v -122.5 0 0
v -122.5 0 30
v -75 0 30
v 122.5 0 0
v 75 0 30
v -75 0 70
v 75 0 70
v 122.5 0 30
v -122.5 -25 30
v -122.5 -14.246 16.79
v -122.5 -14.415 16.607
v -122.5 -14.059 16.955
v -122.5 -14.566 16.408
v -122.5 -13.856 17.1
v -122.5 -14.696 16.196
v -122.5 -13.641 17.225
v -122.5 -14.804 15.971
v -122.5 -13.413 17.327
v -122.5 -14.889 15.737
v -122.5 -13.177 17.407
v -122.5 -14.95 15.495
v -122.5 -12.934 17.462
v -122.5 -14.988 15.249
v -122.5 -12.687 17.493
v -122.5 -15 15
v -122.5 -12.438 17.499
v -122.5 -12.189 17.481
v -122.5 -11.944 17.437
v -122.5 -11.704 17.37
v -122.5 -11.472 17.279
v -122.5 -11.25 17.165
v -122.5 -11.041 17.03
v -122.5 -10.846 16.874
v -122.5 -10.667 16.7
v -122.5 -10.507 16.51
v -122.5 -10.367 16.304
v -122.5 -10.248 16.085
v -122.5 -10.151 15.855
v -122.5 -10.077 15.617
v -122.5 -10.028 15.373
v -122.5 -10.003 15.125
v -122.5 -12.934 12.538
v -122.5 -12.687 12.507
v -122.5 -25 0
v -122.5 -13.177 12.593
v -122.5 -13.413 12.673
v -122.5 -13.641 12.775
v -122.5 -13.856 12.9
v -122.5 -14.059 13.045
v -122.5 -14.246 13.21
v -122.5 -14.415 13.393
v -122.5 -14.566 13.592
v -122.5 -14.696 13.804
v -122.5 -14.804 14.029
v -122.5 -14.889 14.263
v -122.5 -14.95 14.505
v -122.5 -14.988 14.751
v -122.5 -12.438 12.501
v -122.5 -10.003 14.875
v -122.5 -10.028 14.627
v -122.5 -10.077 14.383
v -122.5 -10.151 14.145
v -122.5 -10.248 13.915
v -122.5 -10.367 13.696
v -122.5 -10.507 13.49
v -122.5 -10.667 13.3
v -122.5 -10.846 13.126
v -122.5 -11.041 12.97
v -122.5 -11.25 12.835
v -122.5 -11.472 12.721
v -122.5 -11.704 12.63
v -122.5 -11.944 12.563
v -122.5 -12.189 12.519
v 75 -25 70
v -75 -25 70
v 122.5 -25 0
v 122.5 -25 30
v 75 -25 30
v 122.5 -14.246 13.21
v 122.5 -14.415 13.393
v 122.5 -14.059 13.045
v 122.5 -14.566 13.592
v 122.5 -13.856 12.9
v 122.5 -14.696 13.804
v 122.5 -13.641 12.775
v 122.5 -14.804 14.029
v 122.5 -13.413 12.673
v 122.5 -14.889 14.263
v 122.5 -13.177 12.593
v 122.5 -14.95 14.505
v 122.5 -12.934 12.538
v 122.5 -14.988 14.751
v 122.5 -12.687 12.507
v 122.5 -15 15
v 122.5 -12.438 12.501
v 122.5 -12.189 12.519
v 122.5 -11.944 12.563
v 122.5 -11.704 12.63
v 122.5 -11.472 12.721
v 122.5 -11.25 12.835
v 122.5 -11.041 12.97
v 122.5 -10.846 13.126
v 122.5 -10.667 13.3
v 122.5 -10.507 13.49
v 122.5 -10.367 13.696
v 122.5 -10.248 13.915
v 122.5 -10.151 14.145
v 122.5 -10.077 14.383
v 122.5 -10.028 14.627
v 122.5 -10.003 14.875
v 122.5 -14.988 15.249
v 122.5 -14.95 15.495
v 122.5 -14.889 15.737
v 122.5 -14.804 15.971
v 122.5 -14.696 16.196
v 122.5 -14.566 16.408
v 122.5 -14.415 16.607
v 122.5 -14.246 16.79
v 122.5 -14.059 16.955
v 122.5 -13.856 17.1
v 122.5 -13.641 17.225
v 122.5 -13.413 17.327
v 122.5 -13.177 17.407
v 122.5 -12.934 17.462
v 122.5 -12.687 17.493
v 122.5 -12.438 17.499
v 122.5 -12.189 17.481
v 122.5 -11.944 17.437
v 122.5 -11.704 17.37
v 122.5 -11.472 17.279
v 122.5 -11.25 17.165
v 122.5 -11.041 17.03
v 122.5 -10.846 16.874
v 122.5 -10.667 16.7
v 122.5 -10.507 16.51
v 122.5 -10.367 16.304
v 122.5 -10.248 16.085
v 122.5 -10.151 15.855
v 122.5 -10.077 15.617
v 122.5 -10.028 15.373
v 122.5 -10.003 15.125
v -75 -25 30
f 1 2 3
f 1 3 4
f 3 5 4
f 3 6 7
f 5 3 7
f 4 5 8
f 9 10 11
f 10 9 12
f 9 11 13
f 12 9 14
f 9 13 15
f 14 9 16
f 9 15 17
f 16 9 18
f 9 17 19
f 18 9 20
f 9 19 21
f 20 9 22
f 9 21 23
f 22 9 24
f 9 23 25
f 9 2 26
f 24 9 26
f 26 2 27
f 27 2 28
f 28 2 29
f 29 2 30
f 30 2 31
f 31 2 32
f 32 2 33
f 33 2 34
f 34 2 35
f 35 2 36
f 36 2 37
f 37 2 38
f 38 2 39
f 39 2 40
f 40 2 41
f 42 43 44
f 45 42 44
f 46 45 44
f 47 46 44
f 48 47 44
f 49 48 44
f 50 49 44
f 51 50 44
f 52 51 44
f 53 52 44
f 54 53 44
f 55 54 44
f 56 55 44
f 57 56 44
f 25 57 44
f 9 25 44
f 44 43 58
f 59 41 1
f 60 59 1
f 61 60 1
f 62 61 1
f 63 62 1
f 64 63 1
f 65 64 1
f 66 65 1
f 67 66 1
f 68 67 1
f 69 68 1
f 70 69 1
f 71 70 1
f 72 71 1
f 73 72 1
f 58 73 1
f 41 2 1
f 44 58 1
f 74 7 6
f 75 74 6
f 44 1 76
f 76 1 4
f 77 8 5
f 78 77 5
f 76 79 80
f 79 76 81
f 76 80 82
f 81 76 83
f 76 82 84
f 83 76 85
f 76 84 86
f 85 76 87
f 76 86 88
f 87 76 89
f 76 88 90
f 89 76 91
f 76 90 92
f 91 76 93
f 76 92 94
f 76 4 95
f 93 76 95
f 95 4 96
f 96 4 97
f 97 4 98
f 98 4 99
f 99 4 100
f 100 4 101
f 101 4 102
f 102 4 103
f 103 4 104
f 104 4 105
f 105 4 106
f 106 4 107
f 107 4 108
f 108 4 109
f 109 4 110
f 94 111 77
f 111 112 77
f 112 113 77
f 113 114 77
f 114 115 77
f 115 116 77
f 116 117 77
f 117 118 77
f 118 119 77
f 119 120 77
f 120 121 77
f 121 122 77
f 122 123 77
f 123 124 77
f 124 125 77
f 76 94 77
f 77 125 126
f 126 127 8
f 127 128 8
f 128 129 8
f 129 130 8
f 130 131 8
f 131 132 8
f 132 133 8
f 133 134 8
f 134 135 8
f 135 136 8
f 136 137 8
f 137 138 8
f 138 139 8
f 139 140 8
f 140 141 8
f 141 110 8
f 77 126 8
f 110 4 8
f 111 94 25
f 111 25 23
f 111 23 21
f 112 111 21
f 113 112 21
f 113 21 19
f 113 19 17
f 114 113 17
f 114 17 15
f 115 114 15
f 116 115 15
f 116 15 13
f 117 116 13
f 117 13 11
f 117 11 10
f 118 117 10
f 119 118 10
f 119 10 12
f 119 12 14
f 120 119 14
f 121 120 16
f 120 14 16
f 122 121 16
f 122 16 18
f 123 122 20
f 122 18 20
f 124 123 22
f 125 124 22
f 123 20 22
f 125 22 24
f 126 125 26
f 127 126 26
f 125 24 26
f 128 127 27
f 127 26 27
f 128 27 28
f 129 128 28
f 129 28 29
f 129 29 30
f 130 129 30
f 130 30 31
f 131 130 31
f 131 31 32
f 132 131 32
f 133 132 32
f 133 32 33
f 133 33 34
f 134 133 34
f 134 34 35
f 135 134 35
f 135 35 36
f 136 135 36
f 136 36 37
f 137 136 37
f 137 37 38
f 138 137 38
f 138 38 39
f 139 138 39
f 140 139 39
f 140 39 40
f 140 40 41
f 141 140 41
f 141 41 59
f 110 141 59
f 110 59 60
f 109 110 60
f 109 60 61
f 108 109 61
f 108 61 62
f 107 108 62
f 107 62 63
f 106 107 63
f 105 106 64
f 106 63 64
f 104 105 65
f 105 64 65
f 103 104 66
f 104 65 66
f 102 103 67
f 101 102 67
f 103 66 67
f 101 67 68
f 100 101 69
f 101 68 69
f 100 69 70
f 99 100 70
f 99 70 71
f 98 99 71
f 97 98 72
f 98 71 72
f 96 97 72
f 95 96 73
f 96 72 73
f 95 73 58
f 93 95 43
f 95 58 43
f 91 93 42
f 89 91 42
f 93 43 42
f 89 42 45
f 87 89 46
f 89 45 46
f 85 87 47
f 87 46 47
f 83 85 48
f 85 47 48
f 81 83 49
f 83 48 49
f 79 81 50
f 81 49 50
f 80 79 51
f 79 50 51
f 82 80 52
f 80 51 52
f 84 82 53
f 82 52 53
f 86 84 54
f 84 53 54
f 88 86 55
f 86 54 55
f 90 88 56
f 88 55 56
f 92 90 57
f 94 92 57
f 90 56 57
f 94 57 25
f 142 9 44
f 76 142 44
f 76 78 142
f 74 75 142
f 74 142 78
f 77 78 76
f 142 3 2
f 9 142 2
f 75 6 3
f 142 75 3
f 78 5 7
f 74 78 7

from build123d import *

# Parameters (mm, degrees)
F1_DEPTH = 25
F3_D     = 5


with BuildPart() as f1:
    # F0 (on Front) → F1 (new body)
    with BuildSketch(Plane.XZ):
        Polygon((-122.5, 30), (-122.5, 0), (0, 0), (0, 70), (-75, 70), (-75, 30), align=None)
        Polygon((0, 70), (0, 0), (122.5, 0), (122.5, 30), (75, 30), (75, 70), align=None)
    extrude(amount=F1_DEPTH)

    # F3 (through all)
    with Locations(Plane.YZ.offset(122.5)):
        with Locations((-12.5, 15)):
            Hole(F3_D / 2)


solid = f1.part
